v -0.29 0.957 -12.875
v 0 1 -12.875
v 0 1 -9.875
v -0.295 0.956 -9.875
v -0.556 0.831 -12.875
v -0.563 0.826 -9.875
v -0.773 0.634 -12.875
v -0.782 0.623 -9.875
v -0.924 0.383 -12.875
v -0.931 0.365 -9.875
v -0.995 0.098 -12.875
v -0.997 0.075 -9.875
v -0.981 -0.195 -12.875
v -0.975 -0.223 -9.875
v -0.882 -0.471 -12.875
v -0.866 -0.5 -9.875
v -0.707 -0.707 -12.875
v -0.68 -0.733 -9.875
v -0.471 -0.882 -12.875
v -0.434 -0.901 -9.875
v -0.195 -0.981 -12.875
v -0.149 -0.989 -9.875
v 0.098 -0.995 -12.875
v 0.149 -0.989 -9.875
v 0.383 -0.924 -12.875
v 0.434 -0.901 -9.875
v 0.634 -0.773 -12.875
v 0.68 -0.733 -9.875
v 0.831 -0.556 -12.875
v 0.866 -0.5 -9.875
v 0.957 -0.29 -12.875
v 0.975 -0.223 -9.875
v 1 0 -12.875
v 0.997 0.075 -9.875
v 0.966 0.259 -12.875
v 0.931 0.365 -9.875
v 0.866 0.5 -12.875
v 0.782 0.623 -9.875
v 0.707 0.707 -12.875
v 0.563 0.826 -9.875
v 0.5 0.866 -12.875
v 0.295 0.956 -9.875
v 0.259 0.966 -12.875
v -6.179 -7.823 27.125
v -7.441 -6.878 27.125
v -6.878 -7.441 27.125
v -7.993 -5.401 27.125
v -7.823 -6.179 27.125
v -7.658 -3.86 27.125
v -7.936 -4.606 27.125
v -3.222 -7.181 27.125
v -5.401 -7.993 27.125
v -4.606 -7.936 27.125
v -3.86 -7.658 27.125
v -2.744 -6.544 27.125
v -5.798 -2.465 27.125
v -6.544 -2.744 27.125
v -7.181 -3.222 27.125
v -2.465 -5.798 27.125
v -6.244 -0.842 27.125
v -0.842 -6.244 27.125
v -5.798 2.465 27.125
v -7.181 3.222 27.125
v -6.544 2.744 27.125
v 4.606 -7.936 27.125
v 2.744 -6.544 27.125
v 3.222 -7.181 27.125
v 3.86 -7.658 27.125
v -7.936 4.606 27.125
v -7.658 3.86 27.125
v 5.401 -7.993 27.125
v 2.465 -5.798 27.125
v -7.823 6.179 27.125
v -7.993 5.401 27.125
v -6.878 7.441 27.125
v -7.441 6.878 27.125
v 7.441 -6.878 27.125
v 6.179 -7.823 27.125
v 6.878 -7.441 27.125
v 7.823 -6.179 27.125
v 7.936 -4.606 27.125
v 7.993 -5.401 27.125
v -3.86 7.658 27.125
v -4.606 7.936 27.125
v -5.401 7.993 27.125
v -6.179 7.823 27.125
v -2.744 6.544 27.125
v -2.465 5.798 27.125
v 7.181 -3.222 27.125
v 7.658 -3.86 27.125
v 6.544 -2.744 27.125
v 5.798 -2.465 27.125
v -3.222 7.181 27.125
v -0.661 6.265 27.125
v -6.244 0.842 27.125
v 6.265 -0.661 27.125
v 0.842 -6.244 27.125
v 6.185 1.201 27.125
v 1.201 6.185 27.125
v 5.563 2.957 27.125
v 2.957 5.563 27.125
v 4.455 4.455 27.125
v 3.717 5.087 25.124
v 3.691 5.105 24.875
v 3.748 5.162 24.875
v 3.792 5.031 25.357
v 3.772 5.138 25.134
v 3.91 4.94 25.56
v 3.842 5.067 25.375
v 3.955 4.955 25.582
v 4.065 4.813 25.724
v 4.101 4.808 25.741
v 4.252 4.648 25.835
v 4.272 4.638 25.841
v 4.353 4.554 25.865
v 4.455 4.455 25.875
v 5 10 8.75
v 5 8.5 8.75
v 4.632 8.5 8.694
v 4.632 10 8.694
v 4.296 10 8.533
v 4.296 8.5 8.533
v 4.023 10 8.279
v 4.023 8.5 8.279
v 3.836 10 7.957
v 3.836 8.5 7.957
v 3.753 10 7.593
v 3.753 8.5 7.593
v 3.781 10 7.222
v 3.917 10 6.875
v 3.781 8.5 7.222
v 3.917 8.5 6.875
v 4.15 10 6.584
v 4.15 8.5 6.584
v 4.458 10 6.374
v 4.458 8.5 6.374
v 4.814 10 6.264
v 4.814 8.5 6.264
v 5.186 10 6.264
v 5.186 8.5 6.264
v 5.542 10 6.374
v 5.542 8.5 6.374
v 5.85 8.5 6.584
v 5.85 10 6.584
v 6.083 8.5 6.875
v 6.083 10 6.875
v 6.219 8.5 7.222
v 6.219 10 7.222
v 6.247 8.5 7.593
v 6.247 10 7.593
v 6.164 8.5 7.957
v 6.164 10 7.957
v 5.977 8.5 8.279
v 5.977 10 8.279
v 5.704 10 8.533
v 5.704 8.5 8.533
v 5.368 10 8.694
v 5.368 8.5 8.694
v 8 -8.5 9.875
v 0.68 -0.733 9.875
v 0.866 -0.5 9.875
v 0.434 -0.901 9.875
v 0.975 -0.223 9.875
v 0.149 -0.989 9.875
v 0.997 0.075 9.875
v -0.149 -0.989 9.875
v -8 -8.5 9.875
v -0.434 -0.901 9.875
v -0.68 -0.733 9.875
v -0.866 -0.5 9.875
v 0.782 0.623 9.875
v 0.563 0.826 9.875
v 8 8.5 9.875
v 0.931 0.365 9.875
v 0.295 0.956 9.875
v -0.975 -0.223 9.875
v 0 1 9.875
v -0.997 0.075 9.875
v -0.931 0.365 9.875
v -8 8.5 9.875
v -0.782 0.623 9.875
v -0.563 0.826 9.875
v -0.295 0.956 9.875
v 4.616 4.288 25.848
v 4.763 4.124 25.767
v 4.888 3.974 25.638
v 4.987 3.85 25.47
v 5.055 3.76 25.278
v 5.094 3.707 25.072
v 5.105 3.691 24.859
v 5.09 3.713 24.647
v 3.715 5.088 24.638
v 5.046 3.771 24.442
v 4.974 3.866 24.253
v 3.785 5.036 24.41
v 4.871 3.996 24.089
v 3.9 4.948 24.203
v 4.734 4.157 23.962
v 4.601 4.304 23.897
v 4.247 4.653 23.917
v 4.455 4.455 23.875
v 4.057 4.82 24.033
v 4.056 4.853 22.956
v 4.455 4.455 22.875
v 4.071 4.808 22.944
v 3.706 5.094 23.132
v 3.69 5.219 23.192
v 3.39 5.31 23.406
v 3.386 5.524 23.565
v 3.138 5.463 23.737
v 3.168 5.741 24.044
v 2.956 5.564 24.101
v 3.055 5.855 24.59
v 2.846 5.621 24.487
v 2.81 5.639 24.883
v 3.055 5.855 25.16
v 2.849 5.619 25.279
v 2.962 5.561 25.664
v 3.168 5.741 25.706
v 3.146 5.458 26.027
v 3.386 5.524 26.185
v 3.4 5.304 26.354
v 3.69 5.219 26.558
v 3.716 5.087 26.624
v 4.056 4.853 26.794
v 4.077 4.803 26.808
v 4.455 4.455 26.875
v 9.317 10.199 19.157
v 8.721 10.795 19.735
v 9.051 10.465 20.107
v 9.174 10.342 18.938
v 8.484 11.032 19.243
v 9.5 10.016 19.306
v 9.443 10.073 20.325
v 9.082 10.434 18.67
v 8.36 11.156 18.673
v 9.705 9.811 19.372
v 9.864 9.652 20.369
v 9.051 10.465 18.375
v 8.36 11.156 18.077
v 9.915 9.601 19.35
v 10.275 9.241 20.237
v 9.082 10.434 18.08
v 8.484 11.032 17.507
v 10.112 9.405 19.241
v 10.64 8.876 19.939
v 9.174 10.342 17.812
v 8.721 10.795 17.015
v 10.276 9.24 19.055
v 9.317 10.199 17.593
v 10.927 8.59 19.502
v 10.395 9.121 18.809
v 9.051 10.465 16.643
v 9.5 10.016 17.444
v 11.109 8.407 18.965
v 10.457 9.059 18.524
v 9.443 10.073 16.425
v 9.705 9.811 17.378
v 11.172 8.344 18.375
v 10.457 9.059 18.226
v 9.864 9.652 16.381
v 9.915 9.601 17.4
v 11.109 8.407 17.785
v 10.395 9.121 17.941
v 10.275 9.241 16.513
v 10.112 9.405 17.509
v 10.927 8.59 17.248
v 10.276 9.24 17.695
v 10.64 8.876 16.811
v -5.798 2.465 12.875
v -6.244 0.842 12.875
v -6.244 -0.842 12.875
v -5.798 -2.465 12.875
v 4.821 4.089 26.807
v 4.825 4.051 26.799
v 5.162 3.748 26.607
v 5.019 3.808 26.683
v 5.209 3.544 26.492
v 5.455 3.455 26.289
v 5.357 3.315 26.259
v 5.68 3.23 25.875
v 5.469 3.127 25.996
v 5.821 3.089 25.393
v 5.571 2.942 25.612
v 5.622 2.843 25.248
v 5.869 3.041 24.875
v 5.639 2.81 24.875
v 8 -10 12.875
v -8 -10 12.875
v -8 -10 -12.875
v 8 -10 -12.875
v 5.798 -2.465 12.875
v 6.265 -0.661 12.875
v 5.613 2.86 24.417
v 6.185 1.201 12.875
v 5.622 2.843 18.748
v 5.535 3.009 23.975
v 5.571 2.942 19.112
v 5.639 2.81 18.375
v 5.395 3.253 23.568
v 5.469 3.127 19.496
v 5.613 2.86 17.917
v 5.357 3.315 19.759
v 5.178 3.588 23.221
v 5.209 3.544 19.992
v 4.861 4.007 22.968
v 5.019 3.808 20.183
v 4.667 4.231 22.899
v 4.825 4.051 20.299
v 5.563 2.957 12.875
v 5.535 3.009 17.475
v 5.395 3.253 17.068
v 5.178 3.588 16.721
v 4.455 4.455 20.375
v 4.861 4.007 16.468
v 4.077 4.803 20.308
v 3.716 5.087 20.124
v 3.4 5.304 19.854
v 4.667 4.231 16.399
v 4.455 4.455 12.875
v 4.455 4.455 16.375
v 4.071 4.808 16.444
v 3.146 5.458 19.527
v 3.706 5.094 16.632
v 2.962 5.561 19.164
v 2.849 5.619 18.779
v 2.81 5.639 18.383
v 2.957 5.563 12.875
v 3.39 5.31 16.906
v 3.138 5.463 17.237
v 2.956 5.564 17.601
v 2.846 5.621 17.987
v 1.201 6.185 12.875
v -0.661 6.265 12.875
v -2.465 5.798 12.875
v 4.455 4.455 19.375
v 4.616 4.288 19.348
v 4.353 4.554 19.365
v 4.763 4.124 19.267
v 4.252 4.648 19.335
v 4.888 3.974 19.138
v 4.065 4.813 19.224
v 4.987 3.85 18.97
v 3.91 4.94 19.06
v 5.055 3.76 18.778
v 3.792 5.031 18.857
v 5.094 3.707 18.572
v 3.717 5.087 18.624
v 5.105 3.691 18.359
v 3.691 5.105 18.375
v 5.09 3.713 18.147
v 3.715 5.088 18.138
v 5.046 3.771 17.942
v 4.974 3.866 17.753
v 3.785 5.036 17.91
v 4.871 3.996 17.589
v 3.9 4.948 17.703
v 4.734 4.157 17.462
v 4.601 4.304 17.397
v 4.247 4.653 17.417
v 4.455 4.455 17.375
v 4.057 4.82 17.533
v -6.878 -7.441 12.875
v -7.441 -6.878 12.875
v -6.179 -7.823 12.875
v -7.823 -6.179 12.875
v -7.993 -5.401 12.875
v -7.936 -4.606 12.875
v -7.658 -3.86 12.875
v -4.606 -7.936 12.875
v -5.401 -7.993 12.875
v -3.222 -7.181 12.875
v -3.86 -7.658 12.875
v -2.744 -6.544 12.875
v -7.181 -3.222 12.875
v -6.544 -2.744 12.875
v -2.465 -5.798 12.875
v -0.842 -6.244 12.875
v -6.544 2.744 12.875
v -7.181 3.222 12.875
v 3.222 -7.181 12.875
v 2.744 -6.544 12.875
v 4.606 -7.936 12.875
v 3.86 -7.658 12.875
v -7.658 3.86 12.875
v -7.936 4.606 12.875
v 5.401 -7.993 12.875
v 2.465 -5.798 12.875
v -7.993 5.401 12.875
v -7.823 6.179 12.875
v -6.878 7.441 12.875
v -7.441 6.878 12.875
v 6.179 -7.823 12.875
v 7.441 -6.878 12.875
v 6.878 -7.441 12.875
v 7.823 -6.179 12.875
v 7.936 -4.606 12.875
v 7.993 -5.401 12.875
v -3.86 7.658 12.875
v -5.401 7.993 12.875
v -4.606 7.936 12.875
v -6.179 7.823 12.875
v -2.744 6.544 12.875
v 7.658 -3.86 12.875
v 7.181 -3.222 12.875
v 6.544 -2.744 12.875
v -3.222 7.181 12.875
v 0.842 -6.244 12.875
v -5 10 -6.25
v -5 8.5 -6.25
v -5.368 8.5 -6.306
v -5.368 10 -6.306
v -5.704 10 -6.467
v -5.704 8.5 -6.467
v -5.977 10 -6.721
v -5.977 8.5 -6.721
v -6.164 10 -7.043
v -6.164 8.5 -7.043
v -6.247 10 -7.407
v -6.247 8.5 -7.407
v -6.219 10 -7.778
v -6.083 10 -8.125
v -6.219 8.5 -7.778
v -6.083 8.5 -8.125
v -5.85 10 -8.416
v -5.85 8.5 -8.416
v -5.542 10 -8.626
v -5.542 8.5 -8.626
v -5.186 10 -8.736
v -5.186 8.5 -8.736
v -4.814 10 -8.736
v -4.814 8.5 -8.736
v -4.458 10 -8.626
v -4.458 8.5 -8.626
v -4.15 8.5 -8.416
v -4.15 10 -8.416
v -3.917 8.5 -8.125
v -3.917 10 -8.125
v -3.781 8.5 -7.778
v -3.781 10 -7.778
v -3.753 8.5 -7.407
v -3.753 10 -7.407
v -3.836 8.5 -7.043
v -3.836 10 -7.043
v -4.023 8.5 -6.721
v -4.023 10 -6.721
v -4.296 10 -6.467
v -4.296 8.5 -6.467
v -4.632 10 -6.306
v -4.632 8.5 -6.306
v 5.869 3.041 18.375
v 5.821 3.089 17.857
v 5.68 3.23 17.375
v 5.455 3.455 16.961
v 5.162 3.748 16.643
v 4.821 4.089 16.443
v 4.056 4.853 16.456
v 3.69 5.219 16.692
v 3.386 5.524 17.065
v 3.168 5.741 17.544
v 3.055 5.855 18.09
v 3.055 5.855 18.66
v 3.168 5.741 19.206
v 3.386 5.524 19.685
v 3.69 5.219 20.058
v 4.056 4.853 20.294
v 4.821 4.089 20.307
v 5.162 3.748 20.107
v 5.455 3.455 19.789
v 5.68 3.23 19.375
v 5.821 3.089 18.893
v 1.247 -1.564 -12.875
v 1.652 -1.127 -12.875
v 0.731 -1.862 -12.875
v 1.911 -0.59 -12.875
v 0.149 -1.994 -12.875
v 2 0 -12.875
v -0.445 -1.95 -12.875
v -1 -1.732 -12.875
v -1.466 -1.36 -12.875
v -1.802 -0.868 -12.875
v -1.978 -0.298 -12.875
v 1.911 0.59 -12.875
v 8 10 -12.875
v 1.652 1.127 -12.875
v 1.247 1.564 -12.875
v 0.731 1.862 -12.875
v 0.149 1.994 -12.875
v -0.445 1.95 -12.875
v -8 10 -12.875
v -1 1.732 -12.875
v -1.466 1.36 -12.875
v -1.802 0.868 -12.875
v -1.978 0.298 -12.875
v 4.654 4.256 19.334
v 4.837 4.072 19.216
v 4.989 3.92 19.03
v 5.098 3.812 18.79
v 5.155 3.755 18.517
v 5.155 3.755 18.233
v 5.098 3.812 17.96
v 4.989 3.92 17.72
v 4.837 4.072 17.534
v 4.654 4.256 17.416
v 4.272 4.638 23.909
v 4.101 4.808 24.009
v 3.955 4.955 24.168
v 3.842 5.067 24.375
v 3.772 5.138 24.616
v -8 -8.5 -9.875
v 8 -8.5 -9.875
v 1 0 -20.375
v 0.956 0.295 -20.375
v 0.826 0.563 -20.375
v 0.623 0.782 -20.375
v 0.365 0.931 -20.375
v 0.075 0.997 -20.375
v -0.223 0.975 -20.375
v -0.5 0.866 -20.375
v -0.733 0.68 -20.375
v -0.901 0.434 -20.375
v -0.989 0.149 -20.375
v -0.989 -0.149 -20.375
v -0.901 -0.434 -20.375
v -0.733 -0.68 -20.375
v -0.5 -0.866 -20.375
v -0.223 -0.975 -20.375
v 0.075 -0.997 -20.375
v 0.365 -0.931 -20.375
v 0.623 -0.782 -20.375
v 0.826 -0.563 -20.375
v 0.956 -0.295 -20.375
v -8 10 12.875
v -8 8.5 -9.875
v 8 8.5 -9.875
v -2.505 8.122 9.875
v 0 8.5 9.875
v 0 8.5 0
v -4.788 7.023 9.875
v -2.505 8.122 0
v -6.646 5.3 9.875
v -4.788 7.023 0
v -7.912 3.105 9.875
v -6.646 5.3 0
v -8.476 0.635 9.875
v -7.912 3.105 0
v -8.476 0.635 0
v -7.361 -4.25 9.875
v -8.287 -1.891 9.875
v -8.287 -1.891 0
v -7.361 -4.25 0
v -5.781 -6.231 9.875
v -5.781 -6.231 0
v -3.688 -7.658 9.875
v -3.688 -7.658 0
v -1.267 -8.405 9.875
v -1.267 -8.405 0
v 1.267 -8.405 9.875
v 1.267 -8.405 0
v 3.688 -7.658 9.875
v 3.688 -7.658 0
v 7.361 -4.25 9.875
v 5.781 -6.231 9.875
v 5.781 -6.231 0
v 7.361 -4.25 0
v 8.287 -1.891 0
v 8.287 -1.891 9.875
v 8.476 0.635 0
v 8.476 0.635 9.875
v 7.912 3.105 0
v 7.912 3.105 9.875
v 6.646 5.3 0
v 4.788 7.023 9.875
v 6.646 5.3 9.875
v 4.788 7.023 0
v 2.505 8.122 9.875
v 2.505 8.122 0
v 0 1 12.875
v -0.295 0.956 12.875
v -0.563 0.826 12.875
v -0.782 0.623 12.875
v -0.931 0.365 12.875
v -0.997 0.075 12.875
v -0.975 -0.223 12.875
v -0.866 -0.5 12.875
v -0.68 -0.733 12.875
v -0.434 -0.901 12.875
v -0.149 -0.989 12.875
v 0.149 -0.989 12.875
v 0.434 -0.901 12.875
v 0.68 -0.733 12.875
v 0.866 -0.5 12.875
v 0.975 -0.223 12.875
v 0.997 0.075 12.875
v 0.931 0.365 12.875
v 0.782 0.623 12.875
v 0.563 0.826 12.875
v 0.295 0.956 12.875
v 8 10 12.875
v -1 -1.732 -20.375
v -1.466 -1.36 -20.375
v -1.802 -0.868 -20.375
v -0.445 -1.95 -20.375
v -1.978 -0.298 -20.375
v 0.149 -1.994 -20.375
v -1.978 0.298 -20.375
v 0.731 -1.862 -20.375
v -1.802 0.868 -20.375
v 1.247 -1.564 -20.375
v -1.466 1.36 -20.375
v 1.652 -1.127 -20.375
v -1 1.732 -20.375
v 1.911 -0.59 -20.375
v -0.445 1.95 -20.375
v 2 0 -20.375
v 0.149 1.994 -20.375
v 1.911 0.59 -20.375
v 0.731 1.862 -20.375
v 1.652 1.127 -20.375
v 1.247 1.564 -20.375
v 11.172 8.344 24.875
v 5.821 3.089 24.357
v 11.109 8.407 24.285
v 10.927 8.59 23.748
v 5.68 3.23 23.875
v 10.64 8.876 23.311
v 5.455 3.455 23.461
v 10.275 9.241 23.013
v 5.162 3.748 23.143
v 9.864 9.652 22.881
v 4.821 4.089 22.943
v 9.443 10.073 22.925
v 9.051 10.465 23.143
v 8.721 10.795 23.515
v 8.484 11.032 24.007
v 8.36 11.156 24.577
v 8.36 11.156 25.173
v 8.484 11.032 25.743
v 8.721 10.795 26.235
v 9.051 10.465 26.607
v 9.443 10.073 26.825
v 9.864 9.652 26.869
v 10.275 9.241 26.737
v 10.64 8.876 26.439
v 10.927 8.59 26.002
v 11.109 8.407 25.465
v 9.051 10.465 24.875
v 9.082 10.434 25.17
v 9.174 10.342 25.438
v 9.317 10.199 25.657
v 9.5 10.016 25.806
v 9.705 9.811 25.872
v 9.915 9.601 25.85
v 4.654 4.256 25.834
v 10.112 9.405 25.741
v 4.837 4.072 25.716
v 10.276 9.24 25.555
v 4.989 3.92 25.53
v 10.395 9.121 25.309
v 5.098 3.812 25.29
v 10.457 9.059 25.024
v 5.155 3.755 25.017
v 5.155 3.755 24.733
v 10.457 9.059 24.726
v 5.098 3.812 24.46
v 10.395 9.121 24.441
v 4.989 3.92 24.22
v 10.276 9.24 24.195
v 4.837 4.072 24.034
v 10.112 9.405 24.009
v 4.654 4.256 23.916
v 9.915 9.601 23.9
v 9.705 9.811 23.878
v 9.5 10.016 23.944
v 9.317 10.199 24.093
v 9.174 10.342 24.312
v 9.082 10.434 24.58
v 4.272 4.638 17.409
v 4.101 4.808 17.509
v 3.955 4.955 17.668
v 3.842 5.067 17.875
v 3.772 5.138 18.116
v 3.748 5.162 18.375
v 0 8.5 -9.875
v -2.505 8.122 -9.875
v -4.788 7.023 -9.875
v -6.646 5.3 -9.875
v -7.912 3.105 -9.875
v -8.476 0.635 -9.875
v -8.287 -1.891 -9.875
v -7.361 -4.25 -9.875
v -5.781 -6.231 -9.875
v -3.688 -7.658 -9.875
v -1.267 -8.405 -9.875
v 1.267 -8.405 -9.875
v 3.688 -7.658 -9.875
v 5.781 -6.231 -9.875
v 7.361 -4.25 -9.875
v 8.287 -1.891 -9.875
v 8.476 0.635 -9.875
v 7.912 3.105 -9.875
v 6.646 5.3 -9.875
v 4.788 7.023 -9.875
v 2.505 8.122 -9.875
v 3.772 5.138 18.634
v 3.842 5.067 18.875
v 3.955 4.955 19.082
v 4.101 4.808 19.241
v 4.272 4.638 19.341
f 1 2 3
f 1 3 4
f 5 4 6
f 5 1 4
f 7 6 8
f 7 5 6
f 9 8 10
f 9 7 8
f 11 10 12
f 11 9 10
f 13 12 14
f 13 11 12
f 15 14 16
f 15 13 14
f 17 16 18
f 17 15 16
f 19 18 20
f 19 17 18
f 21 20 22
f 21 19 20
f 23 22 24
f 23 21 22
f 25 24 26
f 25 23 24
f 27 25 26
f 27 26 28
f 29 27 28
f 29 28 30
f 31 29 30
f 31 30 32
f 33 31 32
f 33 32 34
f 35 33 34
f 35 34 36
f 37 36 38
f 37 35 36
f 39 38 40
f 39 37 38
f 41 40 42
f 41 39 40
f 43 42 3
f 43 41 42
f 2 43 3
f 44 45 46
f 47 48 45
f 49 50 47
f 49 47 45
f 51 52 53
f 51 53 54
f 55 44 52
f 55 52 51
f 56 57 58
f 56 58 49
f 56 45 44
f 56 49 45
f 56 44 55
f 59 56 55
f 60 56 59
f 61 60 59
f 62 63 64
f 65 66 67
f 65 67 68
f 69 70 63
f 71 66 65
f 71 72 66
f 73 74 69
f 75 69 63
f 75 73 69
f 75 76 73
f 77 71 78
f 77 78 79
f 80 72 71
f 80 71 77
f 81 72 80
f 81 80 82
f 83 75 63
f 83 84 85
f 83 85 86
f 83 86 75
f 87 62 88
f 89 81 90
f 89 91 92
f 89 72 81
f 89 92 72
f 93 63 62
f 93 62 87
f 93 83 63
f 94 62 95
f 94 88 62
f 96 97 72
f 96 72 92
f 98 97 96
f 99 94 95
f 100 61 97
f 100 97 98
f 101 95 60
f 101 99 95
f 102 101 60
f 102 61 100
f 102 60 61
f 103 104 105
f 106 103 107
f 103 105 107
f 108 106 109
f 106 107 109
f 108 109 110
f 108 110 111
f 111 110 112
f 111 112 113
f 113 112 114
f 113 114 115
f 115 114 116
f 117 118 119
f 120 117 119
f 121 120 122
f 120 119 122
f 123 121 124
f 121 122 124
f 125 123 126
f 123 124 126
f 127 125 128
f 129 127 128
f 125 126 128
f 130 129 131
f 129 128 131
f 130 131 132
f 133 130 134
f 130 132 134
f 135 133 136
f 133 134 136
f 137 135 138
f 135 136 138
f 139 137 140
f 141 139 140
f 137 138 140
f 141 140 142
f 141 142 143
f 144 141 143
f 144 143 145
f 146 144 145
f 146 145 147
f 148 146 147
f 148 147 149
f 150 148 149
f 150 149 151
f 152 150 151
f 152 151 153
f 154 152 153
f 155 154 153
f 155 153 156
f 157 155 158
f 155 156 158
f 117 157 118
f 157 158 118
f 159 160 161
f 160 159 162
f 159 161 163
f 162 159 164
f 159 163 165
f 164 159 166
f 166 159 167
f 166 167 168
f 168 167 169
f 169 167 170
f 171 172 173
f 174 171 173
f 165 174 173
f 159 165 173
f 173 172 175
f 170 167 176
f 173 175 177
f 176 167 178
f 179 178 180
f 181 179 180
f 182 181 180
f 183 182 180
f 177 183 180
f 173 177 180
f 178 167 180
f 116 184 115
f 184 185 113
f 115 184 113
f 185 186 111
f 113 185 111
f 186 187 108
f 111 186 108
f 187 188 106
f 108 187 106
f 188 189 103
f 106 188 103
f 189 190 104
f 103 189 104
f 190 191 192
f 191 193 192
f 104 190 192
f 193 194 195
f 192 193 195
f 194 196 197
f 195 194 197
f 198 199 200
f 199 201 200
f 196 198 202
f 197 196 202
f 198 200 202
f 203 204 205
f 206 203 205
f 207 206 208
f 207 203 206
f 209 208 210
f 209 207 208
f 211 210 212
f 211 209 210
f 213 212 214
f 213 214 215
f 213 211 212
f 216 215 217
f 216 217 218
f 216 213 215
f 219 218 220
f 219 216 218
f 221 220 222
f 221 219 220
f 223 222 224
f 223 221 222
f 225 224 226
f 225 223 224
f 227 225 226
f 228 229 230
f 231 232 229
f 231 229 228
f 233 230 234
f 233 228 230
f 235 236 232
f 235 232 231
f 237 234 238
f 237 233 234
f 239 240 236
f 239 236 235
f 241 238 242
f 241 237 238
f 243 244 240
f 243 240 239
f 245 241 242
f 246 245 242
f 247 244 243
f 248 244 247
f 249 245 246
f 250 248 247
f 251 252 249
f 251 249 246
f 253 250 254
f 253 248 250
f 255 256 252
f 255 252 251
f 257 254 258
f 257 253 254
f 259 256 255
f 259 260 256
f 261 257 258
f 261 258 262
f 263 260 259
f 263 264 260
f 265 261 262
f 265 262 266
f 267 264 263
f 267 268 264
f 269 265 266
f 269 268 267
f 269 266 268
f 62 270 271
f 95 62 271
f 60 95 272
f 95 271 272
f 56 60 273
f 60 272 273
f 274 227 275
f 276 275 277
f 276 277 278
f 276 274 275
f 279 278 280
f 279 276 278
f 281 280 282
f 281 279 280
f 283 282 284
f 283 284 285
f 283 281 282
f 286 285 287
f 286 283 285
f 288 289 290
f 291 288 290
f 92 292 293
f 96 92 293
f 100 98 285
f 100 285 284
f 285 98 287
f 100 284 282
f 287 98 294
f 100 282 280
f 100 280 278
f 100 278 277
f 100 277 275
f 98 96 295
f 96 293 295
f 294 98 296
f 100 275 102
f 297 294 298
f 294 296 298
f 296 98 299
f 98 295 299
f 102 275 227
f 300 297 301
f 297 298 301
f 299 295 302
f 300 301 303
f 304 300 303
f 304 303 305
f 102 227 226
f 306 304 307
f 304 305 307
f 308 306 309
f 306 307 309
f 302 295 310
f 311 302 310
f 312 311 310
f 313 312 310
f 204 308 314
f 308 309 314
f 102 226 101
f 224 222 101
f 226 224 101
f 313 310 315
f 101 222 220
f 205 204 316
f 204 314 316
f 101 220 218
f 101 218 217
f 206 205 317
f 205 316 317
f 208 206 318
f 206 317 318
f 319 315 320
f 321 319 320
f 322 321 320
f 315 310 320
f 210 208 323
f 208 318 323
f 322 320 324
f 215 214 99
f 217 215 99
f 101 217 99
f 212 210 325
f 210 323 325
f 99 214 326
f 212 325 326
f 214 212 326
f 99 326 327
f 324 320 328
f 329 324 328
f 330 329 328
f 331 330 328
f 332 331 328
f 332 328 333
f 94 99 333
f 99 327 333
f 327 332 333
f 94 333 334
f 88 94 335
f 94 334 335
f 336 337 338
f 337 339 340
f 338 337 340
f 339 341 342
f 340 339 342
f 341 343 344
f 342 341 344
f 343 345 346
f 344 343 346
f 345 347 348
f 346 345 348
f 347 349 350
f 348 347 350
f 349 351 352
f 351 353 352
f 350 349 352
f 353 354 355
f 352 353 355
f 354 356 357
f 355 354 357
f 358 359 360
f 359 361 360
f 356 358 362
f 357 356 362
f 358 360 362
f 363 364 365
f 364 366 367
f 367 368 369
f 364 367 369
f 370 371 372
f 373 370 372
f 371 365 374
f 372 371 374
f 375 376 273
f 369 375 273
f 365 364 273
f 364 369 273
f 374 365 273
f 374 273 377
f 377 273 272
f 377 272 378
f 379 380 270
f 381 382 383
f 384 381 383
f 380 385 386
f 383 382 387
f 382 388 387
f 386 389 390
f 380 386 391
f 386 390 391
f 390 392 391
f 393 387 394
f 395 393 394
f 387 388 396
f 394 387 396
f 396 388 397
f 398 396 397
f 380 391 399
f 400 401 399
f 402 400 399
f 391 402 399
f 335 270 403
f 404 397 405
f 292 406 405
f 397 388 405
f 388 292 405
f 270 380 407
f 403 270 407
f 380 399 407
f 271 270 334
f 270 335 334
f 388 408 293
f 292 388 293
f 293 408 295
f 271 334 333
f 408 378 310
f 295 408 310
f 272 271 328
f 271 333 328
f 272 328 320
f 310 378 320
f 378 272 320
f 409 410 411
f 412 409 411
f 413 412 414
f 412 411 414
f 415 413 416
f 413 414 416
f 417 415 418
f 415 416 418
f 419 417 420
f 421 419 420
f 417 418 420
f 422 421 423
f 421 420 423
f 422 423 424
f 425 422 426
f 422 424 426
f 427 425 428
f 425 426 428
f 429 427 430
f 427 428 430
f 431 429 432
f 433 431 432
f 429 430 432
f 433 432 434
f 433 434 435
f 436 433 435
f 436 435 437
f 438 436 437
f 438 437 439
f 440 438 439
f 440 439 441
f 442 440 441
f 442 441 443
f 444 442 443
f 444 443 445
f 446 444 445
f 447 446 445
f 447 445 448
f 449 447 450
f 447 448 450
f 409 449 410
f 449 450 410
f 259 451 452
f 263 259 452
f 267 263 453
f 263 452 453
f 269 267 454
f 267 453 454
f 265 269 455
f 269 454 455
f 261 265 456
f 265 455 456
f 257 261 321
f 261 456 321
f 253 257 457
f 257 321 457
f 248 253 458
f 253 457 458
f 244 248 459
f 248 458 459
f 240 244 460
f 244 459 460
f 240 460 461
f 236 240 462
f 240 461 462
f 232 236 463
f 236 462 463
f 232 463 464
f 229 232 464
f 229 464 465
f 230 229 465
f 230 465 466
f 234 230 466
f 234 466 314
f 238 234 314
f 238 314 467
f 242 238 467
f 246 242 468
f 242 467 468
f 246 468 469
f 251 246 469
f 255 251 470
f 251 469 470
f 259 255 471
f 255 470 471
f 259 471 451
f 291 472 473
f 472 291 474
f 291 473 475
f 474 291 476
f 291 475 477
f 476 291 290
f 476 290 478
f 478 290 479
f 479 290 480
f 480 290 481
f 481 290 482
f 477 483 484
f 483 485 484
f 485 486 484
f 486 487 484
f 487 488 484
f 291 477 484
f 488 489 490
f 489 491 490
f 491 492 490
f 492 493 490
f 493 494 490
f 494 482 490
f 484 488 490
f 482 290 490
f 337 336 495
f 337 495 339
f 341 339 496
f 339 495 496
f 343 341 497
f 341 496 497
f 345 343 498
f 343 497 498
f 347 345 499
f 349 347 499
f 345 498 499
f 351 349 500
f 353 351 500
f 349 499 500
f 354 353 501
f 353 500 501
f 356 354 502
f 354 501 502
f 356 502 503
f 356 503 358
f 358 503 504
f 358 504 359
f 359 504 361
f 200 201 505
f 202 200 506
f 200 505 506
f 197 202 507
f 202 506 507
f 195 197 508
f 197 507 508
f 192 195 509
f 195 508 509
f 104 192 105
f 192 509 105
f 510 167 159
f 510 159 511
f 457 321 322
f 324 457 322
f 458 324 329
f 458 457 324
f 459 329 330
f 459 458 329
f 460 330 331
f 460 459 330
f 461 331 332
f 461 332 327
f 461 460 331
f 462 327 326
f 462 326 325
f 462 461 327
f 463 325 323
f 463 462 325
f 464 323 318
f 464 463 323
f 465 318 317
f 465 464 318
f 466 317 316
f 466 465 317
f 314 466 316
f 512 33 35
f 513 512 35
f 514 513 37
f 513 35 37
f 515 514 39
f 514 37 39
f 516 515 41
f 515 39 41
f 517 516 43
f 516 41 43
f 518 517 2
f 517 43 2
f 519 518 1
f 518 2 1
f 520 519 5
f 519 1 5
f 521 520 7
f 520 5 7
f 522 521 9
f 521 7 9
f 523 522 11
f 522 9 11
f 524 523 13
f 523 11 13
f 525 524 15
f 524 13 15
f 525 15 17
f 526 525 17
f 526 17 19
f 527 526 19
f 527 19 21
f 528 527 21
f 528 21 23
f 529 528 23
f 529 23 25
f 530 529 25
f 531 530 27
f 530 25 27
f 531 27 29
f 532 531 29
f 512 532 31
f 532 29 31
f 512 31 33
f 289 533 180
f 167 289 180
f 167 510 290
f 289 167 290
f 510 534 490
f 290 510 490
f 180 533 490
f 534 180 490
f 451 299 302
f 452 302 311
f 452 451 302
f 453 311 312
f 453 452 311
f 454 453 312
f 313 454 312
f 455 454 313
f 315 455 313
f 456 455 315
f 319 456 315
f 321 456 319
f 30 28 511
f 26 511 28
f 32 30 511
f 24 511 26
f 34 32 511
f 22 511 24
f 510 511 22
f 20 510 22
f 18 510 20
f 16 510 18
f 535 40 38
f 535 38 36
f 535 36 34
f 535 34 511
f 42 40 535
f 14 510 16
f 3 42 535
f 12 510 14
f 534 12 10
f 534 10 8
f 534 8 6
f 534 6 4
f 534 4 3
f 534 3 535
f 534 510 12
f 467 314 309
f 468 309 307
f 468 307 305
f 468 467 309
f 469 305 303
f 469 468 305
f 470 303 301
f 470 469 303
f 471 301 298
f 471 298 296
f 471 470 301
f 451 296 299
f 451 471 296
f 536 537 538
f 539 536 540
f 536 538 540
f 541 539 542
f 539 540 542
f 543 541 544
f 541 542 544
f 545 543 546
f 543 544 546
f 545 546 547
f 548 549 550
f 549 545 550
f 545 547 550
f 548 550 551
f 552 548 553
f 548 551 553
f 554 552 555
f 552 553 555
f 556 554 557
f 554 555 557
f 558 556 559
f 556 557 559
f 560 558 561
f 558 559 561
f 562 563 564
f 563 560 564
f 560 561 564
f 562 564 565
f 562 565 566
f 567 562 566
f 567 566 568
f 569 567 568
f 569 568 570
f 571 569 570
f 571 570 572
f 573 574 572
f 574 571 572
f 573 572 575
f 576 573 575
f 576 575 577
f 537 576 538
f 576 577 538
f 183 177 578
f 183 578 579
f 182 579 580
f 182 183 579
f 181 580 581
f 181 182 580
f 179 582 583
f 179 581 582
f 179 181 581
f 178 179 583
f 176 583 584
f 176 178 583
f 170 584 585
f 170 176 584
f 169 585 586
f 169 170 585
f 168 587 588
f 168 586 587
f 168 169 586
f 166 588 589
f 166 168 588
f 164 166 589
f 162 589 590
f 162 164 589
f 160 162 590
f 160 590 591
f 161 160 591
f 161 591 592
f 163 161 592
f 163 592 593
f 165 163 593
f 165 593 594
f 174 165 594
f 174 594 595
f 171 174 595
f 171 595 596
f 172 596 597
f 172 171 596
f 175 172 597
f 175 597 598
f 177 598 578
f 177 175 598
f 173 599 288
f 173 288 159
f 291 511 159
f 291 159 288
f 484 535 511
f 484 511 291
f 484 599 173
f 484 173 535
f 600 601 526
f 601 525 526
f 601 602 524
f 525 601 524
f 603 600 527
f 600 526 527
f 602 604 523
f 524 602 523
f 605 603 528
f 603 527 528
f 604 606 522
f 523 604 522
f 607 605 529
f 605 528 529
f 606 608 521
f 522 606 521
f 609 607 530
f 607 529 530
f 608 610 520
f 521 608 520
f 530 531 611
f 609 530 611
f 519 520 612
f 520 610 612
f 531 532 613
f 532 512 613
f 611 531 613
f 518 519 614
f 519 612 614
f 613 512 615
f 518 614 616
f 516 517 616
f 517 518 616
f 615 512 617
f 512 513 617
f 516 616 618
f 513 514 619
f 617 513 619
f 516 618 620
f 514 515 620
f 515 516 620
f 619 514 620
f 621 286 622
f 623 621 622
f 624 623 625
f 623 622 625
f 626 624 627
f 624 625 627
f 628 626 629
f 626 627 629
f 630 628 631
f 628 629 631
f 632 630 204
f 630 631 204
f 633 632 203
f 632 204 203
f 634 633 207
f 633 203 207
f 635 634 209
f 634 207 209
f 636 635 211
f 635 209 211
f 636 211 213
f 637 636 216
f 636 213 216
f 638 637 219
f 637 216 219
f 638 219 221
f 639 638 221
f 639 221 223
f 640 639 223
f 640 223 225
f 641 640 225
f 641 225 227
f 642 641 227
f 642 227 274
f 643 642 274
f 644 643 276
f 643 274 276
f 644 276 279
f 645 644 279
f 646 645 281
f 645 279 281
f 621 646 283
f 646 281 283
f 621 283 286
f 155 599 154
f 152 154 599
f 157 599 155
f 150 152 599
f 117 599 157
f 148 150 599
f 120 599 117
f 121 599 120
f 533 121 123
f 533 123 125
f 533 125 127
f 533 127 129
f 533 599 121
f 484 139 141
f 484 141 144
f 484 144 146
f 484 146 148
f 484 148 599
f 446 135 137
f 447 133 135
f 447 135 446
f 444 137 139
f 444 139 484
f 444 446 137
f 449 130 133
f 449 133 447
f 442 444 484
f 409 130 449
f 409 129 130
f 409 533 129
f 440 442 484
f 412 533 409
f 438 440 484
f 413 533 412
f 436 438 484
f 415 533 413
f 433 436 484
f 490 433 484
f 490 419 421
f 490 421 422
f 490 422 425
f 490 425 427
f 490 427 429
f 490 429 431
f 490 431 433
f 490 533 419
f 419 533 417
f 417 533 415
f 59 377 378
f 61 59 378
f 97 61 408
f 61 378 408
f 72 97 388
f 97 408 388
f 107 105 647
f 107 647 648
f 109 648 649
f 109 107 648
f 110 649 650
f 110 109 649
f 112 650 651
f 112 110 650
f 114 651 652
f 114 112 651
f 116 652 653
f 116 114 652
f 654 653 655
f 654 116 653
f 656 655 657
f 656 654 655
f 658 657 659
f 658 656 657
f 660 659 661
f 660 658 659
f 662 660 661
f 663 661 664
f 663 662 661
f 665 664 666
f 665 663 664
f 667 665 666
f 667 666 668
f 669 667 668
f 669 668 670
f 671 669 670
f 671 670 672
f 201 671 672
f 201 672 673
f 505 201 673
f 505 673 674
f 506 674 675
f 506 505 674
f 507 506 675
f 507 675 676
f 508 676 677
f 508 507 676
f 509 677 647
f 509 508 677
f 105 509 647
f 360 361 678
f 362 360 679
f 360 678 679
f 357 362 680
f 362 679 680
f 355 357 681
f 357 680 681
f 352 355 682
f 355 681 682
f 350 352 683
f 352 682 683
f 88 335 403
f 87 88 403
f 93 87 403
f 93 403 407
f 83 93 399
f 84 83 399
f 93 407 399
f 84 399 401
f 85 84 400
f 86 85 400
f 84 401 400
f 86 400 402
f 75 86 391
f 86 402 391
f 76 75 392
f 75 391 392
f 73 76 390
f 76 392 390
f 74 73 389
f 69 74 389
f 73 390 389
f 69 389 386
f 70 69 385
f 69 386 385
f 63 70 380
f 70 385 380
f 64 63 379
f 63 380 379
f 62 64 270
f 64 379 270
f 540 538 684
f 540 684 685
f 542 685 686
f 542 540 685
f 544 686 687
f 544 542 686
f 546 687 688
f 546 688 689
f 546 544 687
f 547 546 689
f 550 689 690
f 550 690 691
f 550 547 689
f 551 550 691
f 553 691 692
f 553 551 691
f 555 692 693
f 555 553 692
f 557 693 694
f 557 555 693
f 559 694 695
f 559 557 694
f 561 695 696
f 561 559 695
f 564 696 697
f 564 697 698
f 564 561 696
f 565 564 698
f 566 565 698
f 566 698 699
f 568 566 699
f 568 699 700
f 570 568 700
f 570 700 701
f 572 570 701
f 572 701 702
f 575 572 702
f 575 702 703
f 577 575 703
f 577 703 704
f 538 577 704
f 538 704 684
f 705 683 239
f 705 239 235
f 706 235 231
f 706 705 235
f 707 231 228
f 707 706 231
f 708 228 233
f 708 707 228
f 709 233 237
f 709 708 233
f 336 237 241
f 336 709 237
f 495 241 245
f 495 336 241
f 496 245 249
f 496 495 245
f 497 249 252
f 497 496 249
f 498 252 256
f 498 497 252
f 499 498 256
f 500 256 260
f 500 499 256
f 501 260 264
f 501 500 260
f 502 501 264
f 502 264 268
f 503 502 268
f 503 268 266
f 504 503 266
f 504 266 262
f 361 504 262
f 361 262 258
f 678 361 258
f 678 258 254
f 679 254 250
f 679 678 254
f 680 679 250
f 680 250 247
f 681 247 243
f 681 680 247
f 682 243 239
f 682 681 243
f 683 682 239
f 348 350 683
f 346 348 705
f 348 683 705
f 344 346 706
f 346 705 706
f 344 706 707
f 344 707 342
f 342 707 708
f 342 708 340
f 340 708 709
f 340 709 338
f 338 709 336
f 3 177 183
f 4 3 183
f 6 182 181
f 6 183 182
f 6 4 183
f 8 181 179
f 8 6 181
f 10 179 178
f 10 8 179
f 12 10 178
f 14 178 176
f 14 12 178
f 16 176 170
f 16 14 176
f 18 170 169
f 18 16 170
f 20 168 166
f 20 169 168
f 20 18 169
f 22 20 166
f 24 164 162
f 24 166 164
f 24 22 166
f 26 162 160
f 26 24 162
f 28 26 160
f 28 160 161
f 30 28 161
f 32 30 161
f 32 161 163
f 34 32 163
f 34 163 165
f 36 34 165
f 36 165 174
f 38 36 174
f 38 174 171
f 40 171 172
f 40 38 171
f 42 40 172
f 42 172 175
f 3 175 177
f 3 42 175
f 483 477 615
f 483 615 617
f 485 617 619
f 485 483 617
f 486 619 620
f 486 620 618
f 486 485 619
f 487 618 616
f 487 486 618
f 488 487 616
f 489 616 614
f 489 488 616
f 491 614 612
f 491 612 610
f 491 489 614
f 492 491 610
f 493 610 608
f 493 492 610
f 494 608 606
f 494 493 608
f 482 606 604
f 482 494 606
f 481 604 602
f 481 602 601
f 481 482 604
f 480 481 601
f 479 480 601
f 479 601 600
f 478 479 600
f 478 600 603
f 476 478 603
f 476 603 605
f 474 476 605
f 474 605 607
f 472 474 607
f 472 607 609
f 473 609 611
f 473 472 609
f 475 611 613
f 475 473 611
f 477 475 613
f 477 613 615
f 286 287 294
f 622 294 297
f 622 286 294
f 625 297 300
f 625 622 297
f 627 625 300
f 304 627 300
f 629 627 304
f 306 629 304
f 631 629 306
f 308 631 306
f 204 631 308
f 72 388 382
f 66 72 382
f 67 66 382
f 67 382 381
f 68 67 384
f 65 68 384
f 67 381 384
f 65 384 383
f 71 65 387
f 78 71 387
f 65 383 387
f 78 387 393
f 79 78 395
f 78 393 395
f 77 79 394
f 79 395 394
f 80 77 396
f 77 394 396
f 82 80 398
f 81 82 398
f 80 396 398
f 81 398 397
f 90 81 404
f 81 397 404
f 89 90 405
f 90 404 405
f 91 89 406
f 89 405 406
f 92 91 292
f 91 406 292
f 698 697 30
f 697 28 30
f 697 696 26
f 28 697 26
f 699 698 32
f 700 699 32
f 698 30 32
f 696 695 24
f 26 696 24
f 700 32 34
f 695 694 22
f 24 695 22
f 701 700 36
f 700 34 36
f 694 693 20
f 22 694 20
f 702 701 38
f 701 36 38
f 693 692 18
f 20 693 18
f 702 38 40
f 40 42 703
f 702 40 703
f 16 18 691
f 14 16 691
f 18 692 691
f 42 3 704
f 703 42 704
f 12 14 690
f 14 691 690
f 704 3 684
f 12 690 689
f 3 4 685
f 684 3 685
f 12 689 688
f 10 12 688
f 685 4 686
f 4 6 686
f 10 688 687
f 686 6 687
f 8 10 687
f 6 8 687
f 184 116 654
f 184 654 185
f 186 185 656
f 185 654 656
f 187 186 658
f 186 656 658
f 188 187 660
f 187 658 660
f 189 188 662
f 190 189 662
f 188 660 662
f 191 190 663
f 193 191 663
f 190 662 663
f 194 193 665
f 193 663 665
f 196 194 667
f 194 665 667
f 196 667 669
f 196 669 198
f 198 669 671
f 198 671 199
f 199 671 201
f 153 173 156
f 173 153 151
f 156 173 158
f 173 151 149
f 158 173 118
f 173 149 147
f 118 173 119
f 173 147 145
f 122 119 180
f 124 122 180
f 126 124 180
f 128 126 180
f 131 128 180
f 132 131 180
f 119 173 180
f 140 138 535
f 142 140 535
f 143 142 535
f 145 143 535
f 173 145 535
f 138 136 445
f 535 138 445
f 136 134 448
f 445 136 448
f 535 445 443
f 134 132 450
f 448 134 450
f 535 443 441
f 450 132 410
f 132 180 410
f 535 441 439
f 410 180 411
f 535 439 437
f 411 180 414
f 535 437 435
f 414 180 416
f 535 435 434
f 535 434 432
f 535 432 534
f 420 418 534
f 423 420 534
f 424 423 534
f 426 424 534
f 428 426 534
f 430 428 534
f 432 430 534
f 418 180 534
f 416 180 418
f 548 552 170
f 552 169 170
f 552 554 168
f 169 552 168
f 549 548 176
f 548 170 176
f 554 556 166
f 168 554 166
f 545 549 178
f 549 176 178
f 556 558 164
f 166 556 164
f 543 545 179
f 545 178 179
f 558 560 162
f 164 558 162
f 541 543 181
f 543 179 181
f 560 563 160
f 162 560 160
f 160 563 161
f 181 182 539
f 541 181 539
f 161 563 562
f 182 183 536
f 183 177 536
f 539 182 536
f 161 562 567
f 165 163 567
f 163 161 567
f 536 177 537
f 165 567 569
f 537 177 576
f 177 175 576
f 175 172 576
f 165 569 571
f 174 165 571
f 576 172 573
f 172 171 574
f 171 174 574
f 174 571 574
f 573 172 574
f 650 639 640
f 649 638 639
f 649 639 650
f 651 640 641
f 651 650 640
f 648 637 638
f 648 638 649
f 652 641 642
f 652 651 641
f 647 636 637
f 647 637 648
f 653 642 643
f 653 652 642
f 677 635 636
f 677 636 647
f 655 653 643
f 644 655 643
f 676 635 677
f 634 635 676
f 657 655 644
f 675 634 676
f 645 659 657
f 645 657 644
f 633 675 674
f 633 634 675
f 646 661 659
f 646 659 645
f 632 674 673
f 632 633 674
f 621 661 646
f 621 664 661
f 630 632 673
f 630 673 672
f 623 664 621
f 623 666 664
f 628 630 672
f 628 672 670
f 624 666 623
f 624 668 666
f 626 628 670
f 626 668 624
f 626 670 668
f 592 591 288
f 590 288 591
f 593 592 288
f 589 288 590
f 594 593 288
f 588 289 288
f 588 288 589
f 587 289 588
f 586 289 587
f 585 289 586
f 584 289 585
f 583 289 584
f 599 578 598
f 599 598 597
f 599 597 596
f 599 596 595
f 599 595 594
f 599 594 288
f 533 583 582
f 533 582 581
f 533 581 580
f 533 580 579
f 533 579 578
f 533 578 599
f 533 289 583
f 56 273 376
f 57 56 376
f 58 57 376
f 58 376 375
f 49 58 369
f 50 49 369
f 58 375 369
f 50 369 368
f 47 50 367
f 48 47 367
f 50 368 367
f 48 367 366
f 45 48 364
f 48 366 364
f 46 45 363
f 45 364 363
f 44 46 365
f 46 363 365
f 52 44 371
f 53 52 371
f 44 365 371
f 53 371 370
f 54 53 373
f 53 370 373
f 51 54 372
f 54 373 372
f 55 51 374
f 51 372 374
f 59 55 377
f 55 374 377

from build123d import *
from build123d.topology import SkipClean

# Parameters (mm, degrees)
FRAME_EXTRUDE_DEPTH                      = 8
FRAME_EXTRUDE_DEPTH_BACK                 = 8
FRAME_SKETCH_W                           = 25.75
FRAME_SKETCH_H                           = 20
FRAME_SKETCH_W_2                         = 19.75
FRAME_SKETCH_H_2                         = 17
ELECTROMAGNET_EXTRUDE_REACH              = 20.159
ELECTROMAGNET_SKETCH_R                   = 8.5
ELECTROMAGNET_EXTRUDE_DIRECTION_2_REACH  = 20.159
PORT_3_SKETCH_R                          = 2
PORT_3_SKETCH_R_2                        = 1
PORT_3_EXTRUDE_DEPTH                     = 7.5
PORT_3_SKETCH_3_R                        = 1
CENTER_HOLE_CUT_DEPTH                    = 29.901773302
BASE_OF_PORT_1_2_PORTS_DEPTH             = 14.25
PORTS_1_2_SKETCH_R                       = 2
PORTS_1_2_SKETCH_R_2                     = 1
PORTS_1_2_EXTRUDE_DEPTH                  = 7.5
PORTS_1_2_EXTRUDE_DIRECTION_2_REACH      = 35.355
PORTS_1_2_EXTRUDE_DIRECTION_2_END_RADIUS = 6.3
MOUNTING_HOLES_PROFILE_SKETCH_W          = 1.25
MOUNTING_HOLES_PROFILE_SKETCH_H          = 3.126136458
MOUNTING_HOLES_AT_2_COUNT                = 2
MOUNTING_HOLES_AT_2_PITCH                = 18.027756377


with BuildPart() as part:
    # Frame Sketch → Frame Extrude (new, two sides: drawn at the far end of the back side and taken through both)
    with BuildSketch(Plane(origin=(0, 0, 0), x_dir=(0, 0, -1), z_dir=(1, 0, 0)).offset(-FRAME_EXTRUDE_DEPTH_BACK)):
        Rectangle(FRAME_SKETCH_W, FRAME_SKETCH_H)
        Rectangle(FRAME_SKETCH_W_2, FRAME_SKETCH_H_2, mode=Mode.SUBTRACT)
    extrude(amount=FRAME_EXTRUDE_DEPTH + FRAME_EXTRUDE_DEPTH_BACK)


with BuildPart() as body_2:

    # Electromagnet Extrude: up to this face of the body (flat: up to its plane)
    electromagnet_extrude_end = Plane(part.part.faces().sort_by_distance((0, 0, 9.875))[0])
    # Electromagnet Sketch → Electromagnet Extrude (new, up to the picked face)
    with BuildSketch(Plane.XY, mode=Mode.PRIVATE) as electromagnet_extrude_sk1:
        with Locations(Location((0, 0, 0), (0, 0, 90))):
            Circle(ELECTROMAGNET_SKETCH_R)
    electromagnet_extrude_tool1 = split(extrude(electromagnet_extrude_sk1.sketch, amount=ELECTROMAGNET_EXTRUDE_REACH, mode=Mode.PRIVATE), bisect_by=electromagnet_extrude_end, keep=Keep.BOTH, mode=Mode.PRIVATE)
    add(electromagnet_extrude_tool1.solids().sort_by(Axis((0, 0, 0), (0, 0, 1)))[0])


    # Electromagnet Extrude direction 2: up to this face of the body (flat: up to its plane)
    electromagnet_extrude_direction_2_end = Plane(part.part.faces().sort_by_distance((0, 0, -9.875))[0])
    # Electromagnet Sketch → Electromagnet Extrude direction 2 (add, up to the picked face)
    with BuildSketch(Plane.XY, mode=Mode.PRIVATE) as electromagnet_extrude_direction_2_sk1:
        with Locations(Location((0, 0, 0), (0, 0, 90))):
            Circle(ELECTROMAGNET_SKETCH_R)
    electromagnet_extrude_direction_2_tool1 = split(extrude(electromagnet_extrude_direction_2_sk1.sketch, amount=-ELECTROMAGNET_EXTRUDE_DIRECTION_2_REACH, mode=Mode.PRIVATE), bisect_by=electromagnet_extrude_direction_2_end, keep=Keep.BOTH, mode=Mode.PRIVATE)
    add(electromagnet_extrude_direction_2_tool1.solids().sort_by(Axis((0, 0, 0), (0, 0, -1)))[0])


with BuildPart() as part_1:
    add(part.part)

    # Port 3 Sketch → Port 3 Extrude (add)
    with BuildSketch(Plane.XY.offset(-12.875)):
        Circle(PORT_3_SKETCH_R)
        Circle(PORT_3_SKETCH_R_2, mode=Mode.SUBTRACT)
    extrude(amount=-PORT_3_EXTRUDE_DEPTH)


with BuildPart() as center_hole_cut_tool:
    # Port 3 Sketch<3> → Center Hole Cut (new, through all)
    with BuildSketch(Plane.XY.offset(-12.875)):
        with Locations(Location((0, 0, 0), (0, 0, 90))):
            Circle(PORT_3_SKETCH_3_R)
    extrude(amount=CENTER_HOLE_CUT_DEPTH)


with BuildPart() as part_2:
    add(part_1.part)

    # Center Hole Cut: cut by center_hole_cut_tool
    add(center_hole_cut_tool.part, mode=Mode.SUBTRACT)

    # Mounting Holes Profile Sketch → Mounting Holes (revolve, cut)
    with BuildSketch(Plane(origin=(5, 10, 7.5), x_dir=(0, 0, 1), z_dir=(1, 0, 0))):
        with Locations((0.625, 1.563068229)):
            Rectangle(MOUNTING_HOLES_PROFILE_SKETCH_W, MOUNTING_HOLES_PROFILE_SKETCH_H)
    mounting_holes = revolve(axis=Axis((5, 16.35, 7.5), (0, -1, 0)), mode=Mode.SUBTRACT)

    # Mounting Holes at 2: Mounting Holes ×2
    with Locations(*[Vector(-0.5547001962252294, 0, -0.8320502943378435) * (i * MOUNTING_HOLES_AT_2_PITCH) for i in range(1, MOUNTING_HOLES_AT_2_COUNT)]):
        add(mounting_holes, mode=Mode.SUBTRACT)


with BuildPart() as body_2_1:
    add(body_2.part)

    # Center Hole Cut: cut by center_hole_cut_tool
    add(center_hole_cut_tool.part, mode=Mode.SUBTRACT)


with BuildPart() as body_3:
    # Base of Ports 1&2 Sketch → Base of Port 1&2 Ports (new body)
    with BuildSketch(Plane.XY.offset(12.875)):
        with BuildLine():
            ThreePointArc((-5.797915365, 2.464584635), (-6.3, 0), (-5.797915365, -2.464584635))
            ThreePointArc((-5.797915365, -2.464584635), (-7.179898987, -7.179898987), (-2.464584635, -5.797915365))
            ThreePointArc((-2.464584635, -5.797915365), (0, -6.3), (2.464584635, -5.797915365))
            ThreePointArc((2.464584635, -5.797915365), (7.179898987, -7.179898987), (5.797915365, -2.464584635))
            ThreePointArc((5.797915365, -2.464584635), (4.454772721, 4.454772721), (-2.464584635, 5.797915365))
            ThreePointArc((-2.464584635, 5.797915365), (-7.179898987, 7.179898987), (-5.797915365, 2.464584635))
        make_face()
    extrude(amount=BASE_OF_PORT_1_2_PORTS_DEPTH)

    # Ports 1&2 Sketch → Ports 1&2 Extrude (add)
    # profile 1 of 2: a face of its own
    with BuildSketch(Plane(origin=(4.454772721, 4.454772721, 0), x_dir=(0, 0, -1), z_dir=(0.7071067811865561, 0.7071067811865389, 0))):
        with Locations(Location((-24.875, 0, 0), (0, 0, 270))):
            Circle(PORTS_1_2_SKETCH_R)
        with Locations(Location((-24.875, 0, 0), (0, 0, 90))):
            Circle(PORTS_1_2_SKETCH_R_2, mode=Mode.SUBTRACT)
    # profile 2 of 2: a face of its own
    with BuildSketch(Plane(origin=(4.454772721, 4.454772721, 0), x_dir=(0, 0, -1), z_dir=(0.7071067811865561, 0.7071067811865389, 0))):
        with Locations(Location((-18.375, 0, 0), (0, 0, 270))):
            Circle(PORTS_1_2_SKETCH_R)
        with Locations(Location((-18.375, 0, 0), (0, 0, 90))):
            Circle(PORTS_1_2_SKETCH_R_2, mode=Mode.SUBTRACT)
    extrude(amount=PORTS_1_2_EXTRUDE_DEPTH)

    # Ports 1&2 Extrude direction 2: up to this cylinder (the profile starts outside it)
    with SkipClean():  # the faces are left unmerged after this step: merging them gives an invalid solid
        ports_1_2_extrude_direction_2_end = Plane(origin=(0, 0, 21.625), z_dir=(0, 0, -1)) * Cylinder(PORTS_1_2_EXTRUDE_DIRECTION_2_END_RADIUS, 90.81, mode=Mode.PRIVATE)
        # Ports 1&2 Sketch → Ports 1&2 Extrude direction 2 (add, up to the surface)
        with BuildSketch(Plane(origin=(4.454772721, 4.454772721, 0), x_dir=(0, 0, -1), z_dir=(0.7071067811865561, 0.7071067811865389, 0)), mode=Mode.PRIVATE) as ports_1_2_extrude_direction_2_sk1:
            with Locations(Location((-24.875, 0, 0), (0, 0, 270))):
                Circle(PORTS_1_2_SKETCH_R)
            with Locations(Location((-24.875, 0, 0), (0, 0, 90))):
                Circle(PORTS_1_2_SKETCH_R_2, mode=Mode.SUBTRACT)
        ports_1_2_extrude_direction_2_tool1 = extrude(ports_1_2_extrude_direction_2_sk1.sketch, amount=-PORTS_1_2_EXTRUDE_DIRECTION_2_REACH, mode=Mode.PRIVATE) - ports_1_2_extrude_direction_2_end
        add(ports_1_2_extrude_direction_2_tool1.solids().sort_by_distance((3.080559, 5.828986, 24.875))[0])
        add(ports_1_2_extrude_direction_2_tool1.solids().sort_by_distance((3.080559, 5.828986, 24.875))[1])
        # Ports 1&2 Sketch → Ports 1&2 Extrude direction 2 (add, up to the surface)
        with BuildSketch(Plane(origin=(4.454772721, 4.454772721, 0), x_dir=(0, 0, -1), z_dir=(0.7071067811865561, 0.7071067811865389, 0)), mode=Mode.PRIVATE) as ports_1_2_extrude_direction_2_sk2:
            with Locations(Location((-18.375, 0, 0), (0, 0, 270))):
                Circle(PORTS_1_2_SKETCH_R)
            with Locations(Location((-18.375, 0, 0), (0, 0, 90))):
                Circle(PORTS_1_2_SKETCH_R_2, mode=Mode.SUBTRACT)
        ports_1_2_extrude_direction_2_tool2 = extrude(ports_1_2_extrude_direction_2_sk2.sketch, amount=-PORTS_1_2_EXTRUDE_DIRECTION_2_REACH, mode=Mode.PRIVATE) - ports_1_2_extrude_direction_2_end
        add(ports_1_2_extrude_direction_2_tool2.solids().sort_by_distance((3.080559, 5.828986, 18.375))[0])
        add(ports_1_2_extrude_direction_2_tool2.solids().sort_by_distance((3.080559, 5.828986, 18.375))[1])


solid = Compound([part_2.part, body_2_1.part, body_3.part])
